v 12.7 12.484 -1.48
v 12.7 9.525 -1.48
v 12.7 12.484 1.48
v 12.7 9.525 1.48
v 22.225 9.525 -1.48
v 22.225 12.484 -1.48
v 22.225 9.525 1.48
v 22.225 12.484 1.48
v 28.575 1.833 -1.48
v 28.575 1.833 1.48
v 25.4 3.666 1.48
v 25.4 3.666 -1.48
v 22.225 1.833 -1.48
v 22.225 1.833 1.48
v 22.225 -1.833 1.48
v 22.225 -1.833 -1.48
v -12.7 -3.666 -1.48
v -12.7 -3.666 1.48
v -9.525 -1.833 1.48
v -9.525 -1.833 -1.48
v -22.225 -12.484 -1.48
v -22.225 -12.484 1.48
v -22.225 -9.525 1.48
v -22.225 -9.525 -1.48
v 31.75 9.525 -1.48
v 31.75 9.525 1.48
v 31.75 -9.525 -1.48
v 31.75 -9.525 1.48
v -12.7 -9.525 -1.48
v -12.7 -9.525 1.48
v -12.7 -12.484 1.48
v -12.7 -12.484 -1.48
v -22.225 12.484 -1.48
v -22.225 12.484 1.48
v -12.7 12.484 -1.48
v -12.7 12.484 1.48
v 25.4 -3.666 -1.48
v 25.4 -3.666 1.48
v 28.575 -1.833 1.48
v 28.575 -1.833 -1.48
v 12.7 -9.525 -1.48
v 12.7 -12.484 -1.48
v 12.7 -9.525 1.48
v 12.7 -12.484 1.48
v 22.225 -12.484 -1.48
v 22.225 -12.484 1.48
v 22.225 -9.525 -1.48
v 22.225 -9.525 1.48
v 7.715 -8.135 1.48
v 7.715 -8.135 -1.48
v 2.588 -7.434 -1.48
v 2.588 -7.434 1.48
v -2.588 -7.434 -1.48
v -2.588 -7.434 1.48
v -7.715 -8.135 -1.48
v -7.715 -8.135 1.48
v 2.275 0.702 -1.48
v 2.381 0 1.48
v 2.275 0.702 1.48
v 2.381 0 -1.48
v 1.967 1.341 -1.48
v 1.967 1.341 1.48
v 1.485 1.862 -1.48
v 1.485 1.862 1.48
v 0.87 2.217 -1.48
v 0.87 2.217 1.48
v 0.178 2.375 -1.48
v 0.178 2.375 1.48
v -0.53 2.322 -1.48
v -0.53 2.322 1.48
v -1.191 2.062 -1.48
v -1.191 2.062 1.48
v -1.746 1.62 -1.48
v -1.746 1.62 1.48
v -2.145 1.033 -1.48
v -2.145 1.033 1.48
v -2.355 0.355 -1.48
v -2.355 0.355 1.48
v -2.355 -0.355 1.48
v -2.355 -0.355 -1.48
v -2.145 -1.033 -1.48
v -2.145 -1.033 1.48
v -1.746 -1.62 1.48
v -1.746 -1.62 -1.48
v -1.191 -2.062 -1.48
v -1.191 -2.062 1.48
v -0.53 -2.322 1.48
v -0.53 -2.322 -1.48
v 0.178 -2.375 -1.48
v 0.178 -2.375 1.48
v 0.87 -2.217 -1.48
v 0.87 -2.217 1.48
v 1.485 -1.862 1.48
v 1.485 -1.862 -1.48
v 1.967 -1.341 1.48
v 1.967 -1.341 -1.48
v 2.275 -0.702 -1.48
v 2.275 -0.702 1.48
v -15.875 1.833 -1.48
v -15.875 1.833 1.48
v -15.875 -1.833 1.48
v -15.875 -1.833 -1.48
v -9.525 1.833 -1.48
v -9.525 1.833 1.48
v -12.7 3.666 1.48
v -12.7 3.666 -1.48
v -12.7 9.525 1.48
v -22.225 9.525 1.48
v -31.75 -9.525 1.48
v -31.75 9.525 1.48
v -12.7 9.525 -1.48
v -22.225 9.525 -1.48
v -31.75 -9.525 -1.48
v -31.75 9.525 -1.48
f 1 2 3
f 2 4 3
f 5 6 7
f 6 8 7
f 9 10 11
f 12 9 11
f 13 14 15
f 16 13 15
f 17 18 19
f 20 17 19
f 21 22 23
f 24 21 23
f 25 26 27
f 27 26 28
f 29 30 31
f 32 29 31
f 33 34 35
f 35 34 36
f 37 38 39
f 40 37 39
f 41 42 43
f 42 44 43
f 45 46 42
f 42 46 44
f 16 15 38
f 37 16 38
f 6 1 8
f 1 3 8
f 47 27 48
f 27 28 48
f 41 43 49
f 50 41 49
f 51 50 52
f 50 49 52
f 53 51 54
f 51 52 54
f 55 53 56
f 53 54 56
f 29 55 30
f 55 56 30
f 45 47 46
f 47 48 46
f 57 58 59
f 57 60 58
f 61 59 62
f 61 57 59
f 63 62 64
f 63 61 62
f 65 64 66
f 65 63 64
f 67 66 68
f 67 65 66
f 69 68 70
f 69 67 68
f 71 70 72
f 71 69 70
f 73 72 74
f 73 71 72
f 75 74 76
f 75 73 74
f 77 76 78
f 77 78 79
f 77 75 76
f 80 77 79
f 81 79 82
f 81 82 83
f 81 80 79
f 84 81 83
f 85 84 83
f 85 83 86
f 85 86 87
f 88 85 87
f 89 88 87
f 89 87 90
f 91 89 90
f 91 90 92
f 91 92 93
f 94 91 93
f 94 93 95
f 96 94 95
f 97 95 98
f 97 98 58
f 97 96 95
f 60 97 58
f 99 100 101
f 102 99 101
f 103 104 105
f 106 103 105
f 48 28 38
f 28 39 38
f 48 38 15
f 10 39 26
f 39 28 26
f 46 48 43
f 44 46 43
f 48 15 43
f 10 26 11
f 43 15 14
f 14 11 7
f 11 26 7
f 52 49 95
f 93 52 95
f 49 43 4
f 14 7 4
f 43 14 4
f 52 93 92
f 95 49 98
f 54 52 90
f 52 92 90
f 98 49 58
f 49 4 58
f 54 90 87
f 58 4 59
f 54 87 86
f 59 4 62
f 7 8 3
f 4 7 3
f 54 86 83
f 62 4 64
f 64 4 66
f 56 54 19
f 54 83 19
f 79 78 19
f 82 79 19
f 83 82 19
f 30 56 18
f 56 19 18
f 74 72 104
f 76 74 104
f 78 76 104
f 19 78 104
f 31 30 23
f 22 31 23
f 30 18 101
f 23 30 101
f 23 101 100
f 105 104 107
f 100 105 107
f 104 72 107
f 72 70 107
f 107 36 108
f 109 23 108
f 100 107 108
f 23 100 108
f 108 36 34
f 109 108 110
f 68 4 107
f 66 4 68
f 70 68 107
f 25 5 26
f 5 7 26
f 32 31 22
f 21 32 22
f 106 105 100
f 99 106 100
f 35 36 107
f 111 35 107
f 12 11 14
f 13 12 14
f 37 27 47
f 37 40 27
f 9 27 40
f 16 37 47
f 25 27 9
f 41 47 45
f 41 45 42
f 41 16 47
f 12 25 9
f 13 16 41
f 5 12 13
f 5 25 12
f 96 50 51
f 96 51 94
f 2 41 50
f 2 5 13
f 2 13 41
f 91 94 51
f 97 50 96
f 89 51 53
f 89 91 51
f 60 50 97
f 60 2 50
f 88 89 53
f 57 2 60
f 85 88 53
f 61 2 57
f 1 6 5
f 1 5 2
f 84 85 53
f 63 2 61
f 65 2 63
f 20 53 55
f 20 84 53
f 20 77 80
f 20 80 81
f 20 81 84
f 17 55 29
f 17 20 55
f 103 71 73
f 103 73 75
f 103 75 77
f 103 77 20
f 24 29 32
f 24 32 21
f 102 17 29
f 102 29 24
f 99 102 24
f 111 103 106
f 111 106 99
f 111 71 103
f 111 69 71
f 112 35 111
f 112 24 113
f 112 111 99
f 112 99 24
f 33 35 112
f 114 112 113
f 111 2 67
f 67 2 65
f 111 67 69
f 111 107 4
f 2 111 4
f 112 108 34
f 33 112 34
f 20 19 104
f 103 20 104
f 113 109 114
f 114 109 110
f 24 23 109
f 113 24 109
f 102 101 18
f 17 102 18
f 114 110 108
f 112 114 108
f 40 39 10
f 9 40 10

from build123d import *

# Parameters (mm, degrees)
SKETCH1_R           = 2.38125
BOSS_EXTRUDE1_DEPTH = 1.47955
CUT_EXTRUDE1_REACH  = 4.959
CUT_EXTRUDE2_REACH  = 4.959
CUT_EXTRUDE3_DEPTH  = 3.9591


with BuildPart() as part:
    # Sketch1 → Boss-Extrude1 (new body, symmetric)
    with BuildSketch(Plane.XY):
        Polygon((-12.7, 9.525), (12.7, 9.525), (12.7, 12.4841), (22.225, 12.4841), (22.225, 9.525), (31.75, 9.525), (31.75, -9.525), (22.225, -9.525), (22.225, -12.4841), (12.7, -12.4841), (12.7, -9.525), (-12.7, -9.525), (-12.7, -12.4841), (-22.225, -12.4841), (-22.225, -9.525), (-31.75, -9.525), (-31.75, 9.525), (-22.225, 9.525), (-22.225, 12.4841), (-12.7, 12.4841), align=None)
        Circle(SKETCH1_R, mode=Mode.SUBTRACT)
    extrude(amount=BOSS_EXTRUDE1_DEPTH, both=True)

    # Sketch2 → Cut-Extrude1 (cut, up to next)
    with BuildSketch(Plane.XY.offset(1.47955), mode=Mode.PRIVATE) as cut_extrude1_sk1:
        Polygon((-12.7, -3.666174209), (-9.525, -1.833087105), (-9.525, 1.833087105), (-12.7, 3.666174209), (-15.875, 1.833087105), (-15.875, -1.833087105), align=None)
    cut_extrude1_tool1 = extrude(cut_extrude1_sk1.sketch, amount=-CUT_EXTRUDE1_REACH, mode=Mode.PRIVATE) & part.part
    add(cut_extrude1_tool1.solids().sort_by_distance((-12.7, 0, 1.47955))[0], mode=Mode.SUBTRACT)

    # Sketch3 → Cut-Extrude2 (cut, up to next)
    with BuildSketch(Plane.XY.offset(1.47955), mode=Mode.PRIVATE) as cut_extrude2_sk1:
        Polygon((25.4, -3.666174209), (28.575, -1.833087105), (28.575, 1.833087105), (25.4, 3.666174209), (22.225, 1.833087105), (22.225, -1.833087105), align=None)
    cut_extrude2_tool1 = extrude(cut_extrude2_sk1.sketch, amount=-CUT_EXTRUDE2_REACH, mode=Mode.PRIVATE) & part.part
    add(cut_extrude2_tool1.solids().sort_by_distance((25.4, 0, 1.47955))[0], mode=Mode.SUBTRACT)

    # Sketch4 → Cut-Extrude3 (cut, through all)
    with BuildSketch(Plane.XY.offset(1.47955)):
        with BuildLine():
            Line((-12.7, -9.525), (12.7, -9.525))
            ThreePointArc((12.7, -9.525), (0, -7.346024484), (-12.7, -9.525))
        make_face()
    extrude(amount=-CUT_EXTRUDE3_DEPTH, mode=Mode.SUBTRACT)


solid = part.part
